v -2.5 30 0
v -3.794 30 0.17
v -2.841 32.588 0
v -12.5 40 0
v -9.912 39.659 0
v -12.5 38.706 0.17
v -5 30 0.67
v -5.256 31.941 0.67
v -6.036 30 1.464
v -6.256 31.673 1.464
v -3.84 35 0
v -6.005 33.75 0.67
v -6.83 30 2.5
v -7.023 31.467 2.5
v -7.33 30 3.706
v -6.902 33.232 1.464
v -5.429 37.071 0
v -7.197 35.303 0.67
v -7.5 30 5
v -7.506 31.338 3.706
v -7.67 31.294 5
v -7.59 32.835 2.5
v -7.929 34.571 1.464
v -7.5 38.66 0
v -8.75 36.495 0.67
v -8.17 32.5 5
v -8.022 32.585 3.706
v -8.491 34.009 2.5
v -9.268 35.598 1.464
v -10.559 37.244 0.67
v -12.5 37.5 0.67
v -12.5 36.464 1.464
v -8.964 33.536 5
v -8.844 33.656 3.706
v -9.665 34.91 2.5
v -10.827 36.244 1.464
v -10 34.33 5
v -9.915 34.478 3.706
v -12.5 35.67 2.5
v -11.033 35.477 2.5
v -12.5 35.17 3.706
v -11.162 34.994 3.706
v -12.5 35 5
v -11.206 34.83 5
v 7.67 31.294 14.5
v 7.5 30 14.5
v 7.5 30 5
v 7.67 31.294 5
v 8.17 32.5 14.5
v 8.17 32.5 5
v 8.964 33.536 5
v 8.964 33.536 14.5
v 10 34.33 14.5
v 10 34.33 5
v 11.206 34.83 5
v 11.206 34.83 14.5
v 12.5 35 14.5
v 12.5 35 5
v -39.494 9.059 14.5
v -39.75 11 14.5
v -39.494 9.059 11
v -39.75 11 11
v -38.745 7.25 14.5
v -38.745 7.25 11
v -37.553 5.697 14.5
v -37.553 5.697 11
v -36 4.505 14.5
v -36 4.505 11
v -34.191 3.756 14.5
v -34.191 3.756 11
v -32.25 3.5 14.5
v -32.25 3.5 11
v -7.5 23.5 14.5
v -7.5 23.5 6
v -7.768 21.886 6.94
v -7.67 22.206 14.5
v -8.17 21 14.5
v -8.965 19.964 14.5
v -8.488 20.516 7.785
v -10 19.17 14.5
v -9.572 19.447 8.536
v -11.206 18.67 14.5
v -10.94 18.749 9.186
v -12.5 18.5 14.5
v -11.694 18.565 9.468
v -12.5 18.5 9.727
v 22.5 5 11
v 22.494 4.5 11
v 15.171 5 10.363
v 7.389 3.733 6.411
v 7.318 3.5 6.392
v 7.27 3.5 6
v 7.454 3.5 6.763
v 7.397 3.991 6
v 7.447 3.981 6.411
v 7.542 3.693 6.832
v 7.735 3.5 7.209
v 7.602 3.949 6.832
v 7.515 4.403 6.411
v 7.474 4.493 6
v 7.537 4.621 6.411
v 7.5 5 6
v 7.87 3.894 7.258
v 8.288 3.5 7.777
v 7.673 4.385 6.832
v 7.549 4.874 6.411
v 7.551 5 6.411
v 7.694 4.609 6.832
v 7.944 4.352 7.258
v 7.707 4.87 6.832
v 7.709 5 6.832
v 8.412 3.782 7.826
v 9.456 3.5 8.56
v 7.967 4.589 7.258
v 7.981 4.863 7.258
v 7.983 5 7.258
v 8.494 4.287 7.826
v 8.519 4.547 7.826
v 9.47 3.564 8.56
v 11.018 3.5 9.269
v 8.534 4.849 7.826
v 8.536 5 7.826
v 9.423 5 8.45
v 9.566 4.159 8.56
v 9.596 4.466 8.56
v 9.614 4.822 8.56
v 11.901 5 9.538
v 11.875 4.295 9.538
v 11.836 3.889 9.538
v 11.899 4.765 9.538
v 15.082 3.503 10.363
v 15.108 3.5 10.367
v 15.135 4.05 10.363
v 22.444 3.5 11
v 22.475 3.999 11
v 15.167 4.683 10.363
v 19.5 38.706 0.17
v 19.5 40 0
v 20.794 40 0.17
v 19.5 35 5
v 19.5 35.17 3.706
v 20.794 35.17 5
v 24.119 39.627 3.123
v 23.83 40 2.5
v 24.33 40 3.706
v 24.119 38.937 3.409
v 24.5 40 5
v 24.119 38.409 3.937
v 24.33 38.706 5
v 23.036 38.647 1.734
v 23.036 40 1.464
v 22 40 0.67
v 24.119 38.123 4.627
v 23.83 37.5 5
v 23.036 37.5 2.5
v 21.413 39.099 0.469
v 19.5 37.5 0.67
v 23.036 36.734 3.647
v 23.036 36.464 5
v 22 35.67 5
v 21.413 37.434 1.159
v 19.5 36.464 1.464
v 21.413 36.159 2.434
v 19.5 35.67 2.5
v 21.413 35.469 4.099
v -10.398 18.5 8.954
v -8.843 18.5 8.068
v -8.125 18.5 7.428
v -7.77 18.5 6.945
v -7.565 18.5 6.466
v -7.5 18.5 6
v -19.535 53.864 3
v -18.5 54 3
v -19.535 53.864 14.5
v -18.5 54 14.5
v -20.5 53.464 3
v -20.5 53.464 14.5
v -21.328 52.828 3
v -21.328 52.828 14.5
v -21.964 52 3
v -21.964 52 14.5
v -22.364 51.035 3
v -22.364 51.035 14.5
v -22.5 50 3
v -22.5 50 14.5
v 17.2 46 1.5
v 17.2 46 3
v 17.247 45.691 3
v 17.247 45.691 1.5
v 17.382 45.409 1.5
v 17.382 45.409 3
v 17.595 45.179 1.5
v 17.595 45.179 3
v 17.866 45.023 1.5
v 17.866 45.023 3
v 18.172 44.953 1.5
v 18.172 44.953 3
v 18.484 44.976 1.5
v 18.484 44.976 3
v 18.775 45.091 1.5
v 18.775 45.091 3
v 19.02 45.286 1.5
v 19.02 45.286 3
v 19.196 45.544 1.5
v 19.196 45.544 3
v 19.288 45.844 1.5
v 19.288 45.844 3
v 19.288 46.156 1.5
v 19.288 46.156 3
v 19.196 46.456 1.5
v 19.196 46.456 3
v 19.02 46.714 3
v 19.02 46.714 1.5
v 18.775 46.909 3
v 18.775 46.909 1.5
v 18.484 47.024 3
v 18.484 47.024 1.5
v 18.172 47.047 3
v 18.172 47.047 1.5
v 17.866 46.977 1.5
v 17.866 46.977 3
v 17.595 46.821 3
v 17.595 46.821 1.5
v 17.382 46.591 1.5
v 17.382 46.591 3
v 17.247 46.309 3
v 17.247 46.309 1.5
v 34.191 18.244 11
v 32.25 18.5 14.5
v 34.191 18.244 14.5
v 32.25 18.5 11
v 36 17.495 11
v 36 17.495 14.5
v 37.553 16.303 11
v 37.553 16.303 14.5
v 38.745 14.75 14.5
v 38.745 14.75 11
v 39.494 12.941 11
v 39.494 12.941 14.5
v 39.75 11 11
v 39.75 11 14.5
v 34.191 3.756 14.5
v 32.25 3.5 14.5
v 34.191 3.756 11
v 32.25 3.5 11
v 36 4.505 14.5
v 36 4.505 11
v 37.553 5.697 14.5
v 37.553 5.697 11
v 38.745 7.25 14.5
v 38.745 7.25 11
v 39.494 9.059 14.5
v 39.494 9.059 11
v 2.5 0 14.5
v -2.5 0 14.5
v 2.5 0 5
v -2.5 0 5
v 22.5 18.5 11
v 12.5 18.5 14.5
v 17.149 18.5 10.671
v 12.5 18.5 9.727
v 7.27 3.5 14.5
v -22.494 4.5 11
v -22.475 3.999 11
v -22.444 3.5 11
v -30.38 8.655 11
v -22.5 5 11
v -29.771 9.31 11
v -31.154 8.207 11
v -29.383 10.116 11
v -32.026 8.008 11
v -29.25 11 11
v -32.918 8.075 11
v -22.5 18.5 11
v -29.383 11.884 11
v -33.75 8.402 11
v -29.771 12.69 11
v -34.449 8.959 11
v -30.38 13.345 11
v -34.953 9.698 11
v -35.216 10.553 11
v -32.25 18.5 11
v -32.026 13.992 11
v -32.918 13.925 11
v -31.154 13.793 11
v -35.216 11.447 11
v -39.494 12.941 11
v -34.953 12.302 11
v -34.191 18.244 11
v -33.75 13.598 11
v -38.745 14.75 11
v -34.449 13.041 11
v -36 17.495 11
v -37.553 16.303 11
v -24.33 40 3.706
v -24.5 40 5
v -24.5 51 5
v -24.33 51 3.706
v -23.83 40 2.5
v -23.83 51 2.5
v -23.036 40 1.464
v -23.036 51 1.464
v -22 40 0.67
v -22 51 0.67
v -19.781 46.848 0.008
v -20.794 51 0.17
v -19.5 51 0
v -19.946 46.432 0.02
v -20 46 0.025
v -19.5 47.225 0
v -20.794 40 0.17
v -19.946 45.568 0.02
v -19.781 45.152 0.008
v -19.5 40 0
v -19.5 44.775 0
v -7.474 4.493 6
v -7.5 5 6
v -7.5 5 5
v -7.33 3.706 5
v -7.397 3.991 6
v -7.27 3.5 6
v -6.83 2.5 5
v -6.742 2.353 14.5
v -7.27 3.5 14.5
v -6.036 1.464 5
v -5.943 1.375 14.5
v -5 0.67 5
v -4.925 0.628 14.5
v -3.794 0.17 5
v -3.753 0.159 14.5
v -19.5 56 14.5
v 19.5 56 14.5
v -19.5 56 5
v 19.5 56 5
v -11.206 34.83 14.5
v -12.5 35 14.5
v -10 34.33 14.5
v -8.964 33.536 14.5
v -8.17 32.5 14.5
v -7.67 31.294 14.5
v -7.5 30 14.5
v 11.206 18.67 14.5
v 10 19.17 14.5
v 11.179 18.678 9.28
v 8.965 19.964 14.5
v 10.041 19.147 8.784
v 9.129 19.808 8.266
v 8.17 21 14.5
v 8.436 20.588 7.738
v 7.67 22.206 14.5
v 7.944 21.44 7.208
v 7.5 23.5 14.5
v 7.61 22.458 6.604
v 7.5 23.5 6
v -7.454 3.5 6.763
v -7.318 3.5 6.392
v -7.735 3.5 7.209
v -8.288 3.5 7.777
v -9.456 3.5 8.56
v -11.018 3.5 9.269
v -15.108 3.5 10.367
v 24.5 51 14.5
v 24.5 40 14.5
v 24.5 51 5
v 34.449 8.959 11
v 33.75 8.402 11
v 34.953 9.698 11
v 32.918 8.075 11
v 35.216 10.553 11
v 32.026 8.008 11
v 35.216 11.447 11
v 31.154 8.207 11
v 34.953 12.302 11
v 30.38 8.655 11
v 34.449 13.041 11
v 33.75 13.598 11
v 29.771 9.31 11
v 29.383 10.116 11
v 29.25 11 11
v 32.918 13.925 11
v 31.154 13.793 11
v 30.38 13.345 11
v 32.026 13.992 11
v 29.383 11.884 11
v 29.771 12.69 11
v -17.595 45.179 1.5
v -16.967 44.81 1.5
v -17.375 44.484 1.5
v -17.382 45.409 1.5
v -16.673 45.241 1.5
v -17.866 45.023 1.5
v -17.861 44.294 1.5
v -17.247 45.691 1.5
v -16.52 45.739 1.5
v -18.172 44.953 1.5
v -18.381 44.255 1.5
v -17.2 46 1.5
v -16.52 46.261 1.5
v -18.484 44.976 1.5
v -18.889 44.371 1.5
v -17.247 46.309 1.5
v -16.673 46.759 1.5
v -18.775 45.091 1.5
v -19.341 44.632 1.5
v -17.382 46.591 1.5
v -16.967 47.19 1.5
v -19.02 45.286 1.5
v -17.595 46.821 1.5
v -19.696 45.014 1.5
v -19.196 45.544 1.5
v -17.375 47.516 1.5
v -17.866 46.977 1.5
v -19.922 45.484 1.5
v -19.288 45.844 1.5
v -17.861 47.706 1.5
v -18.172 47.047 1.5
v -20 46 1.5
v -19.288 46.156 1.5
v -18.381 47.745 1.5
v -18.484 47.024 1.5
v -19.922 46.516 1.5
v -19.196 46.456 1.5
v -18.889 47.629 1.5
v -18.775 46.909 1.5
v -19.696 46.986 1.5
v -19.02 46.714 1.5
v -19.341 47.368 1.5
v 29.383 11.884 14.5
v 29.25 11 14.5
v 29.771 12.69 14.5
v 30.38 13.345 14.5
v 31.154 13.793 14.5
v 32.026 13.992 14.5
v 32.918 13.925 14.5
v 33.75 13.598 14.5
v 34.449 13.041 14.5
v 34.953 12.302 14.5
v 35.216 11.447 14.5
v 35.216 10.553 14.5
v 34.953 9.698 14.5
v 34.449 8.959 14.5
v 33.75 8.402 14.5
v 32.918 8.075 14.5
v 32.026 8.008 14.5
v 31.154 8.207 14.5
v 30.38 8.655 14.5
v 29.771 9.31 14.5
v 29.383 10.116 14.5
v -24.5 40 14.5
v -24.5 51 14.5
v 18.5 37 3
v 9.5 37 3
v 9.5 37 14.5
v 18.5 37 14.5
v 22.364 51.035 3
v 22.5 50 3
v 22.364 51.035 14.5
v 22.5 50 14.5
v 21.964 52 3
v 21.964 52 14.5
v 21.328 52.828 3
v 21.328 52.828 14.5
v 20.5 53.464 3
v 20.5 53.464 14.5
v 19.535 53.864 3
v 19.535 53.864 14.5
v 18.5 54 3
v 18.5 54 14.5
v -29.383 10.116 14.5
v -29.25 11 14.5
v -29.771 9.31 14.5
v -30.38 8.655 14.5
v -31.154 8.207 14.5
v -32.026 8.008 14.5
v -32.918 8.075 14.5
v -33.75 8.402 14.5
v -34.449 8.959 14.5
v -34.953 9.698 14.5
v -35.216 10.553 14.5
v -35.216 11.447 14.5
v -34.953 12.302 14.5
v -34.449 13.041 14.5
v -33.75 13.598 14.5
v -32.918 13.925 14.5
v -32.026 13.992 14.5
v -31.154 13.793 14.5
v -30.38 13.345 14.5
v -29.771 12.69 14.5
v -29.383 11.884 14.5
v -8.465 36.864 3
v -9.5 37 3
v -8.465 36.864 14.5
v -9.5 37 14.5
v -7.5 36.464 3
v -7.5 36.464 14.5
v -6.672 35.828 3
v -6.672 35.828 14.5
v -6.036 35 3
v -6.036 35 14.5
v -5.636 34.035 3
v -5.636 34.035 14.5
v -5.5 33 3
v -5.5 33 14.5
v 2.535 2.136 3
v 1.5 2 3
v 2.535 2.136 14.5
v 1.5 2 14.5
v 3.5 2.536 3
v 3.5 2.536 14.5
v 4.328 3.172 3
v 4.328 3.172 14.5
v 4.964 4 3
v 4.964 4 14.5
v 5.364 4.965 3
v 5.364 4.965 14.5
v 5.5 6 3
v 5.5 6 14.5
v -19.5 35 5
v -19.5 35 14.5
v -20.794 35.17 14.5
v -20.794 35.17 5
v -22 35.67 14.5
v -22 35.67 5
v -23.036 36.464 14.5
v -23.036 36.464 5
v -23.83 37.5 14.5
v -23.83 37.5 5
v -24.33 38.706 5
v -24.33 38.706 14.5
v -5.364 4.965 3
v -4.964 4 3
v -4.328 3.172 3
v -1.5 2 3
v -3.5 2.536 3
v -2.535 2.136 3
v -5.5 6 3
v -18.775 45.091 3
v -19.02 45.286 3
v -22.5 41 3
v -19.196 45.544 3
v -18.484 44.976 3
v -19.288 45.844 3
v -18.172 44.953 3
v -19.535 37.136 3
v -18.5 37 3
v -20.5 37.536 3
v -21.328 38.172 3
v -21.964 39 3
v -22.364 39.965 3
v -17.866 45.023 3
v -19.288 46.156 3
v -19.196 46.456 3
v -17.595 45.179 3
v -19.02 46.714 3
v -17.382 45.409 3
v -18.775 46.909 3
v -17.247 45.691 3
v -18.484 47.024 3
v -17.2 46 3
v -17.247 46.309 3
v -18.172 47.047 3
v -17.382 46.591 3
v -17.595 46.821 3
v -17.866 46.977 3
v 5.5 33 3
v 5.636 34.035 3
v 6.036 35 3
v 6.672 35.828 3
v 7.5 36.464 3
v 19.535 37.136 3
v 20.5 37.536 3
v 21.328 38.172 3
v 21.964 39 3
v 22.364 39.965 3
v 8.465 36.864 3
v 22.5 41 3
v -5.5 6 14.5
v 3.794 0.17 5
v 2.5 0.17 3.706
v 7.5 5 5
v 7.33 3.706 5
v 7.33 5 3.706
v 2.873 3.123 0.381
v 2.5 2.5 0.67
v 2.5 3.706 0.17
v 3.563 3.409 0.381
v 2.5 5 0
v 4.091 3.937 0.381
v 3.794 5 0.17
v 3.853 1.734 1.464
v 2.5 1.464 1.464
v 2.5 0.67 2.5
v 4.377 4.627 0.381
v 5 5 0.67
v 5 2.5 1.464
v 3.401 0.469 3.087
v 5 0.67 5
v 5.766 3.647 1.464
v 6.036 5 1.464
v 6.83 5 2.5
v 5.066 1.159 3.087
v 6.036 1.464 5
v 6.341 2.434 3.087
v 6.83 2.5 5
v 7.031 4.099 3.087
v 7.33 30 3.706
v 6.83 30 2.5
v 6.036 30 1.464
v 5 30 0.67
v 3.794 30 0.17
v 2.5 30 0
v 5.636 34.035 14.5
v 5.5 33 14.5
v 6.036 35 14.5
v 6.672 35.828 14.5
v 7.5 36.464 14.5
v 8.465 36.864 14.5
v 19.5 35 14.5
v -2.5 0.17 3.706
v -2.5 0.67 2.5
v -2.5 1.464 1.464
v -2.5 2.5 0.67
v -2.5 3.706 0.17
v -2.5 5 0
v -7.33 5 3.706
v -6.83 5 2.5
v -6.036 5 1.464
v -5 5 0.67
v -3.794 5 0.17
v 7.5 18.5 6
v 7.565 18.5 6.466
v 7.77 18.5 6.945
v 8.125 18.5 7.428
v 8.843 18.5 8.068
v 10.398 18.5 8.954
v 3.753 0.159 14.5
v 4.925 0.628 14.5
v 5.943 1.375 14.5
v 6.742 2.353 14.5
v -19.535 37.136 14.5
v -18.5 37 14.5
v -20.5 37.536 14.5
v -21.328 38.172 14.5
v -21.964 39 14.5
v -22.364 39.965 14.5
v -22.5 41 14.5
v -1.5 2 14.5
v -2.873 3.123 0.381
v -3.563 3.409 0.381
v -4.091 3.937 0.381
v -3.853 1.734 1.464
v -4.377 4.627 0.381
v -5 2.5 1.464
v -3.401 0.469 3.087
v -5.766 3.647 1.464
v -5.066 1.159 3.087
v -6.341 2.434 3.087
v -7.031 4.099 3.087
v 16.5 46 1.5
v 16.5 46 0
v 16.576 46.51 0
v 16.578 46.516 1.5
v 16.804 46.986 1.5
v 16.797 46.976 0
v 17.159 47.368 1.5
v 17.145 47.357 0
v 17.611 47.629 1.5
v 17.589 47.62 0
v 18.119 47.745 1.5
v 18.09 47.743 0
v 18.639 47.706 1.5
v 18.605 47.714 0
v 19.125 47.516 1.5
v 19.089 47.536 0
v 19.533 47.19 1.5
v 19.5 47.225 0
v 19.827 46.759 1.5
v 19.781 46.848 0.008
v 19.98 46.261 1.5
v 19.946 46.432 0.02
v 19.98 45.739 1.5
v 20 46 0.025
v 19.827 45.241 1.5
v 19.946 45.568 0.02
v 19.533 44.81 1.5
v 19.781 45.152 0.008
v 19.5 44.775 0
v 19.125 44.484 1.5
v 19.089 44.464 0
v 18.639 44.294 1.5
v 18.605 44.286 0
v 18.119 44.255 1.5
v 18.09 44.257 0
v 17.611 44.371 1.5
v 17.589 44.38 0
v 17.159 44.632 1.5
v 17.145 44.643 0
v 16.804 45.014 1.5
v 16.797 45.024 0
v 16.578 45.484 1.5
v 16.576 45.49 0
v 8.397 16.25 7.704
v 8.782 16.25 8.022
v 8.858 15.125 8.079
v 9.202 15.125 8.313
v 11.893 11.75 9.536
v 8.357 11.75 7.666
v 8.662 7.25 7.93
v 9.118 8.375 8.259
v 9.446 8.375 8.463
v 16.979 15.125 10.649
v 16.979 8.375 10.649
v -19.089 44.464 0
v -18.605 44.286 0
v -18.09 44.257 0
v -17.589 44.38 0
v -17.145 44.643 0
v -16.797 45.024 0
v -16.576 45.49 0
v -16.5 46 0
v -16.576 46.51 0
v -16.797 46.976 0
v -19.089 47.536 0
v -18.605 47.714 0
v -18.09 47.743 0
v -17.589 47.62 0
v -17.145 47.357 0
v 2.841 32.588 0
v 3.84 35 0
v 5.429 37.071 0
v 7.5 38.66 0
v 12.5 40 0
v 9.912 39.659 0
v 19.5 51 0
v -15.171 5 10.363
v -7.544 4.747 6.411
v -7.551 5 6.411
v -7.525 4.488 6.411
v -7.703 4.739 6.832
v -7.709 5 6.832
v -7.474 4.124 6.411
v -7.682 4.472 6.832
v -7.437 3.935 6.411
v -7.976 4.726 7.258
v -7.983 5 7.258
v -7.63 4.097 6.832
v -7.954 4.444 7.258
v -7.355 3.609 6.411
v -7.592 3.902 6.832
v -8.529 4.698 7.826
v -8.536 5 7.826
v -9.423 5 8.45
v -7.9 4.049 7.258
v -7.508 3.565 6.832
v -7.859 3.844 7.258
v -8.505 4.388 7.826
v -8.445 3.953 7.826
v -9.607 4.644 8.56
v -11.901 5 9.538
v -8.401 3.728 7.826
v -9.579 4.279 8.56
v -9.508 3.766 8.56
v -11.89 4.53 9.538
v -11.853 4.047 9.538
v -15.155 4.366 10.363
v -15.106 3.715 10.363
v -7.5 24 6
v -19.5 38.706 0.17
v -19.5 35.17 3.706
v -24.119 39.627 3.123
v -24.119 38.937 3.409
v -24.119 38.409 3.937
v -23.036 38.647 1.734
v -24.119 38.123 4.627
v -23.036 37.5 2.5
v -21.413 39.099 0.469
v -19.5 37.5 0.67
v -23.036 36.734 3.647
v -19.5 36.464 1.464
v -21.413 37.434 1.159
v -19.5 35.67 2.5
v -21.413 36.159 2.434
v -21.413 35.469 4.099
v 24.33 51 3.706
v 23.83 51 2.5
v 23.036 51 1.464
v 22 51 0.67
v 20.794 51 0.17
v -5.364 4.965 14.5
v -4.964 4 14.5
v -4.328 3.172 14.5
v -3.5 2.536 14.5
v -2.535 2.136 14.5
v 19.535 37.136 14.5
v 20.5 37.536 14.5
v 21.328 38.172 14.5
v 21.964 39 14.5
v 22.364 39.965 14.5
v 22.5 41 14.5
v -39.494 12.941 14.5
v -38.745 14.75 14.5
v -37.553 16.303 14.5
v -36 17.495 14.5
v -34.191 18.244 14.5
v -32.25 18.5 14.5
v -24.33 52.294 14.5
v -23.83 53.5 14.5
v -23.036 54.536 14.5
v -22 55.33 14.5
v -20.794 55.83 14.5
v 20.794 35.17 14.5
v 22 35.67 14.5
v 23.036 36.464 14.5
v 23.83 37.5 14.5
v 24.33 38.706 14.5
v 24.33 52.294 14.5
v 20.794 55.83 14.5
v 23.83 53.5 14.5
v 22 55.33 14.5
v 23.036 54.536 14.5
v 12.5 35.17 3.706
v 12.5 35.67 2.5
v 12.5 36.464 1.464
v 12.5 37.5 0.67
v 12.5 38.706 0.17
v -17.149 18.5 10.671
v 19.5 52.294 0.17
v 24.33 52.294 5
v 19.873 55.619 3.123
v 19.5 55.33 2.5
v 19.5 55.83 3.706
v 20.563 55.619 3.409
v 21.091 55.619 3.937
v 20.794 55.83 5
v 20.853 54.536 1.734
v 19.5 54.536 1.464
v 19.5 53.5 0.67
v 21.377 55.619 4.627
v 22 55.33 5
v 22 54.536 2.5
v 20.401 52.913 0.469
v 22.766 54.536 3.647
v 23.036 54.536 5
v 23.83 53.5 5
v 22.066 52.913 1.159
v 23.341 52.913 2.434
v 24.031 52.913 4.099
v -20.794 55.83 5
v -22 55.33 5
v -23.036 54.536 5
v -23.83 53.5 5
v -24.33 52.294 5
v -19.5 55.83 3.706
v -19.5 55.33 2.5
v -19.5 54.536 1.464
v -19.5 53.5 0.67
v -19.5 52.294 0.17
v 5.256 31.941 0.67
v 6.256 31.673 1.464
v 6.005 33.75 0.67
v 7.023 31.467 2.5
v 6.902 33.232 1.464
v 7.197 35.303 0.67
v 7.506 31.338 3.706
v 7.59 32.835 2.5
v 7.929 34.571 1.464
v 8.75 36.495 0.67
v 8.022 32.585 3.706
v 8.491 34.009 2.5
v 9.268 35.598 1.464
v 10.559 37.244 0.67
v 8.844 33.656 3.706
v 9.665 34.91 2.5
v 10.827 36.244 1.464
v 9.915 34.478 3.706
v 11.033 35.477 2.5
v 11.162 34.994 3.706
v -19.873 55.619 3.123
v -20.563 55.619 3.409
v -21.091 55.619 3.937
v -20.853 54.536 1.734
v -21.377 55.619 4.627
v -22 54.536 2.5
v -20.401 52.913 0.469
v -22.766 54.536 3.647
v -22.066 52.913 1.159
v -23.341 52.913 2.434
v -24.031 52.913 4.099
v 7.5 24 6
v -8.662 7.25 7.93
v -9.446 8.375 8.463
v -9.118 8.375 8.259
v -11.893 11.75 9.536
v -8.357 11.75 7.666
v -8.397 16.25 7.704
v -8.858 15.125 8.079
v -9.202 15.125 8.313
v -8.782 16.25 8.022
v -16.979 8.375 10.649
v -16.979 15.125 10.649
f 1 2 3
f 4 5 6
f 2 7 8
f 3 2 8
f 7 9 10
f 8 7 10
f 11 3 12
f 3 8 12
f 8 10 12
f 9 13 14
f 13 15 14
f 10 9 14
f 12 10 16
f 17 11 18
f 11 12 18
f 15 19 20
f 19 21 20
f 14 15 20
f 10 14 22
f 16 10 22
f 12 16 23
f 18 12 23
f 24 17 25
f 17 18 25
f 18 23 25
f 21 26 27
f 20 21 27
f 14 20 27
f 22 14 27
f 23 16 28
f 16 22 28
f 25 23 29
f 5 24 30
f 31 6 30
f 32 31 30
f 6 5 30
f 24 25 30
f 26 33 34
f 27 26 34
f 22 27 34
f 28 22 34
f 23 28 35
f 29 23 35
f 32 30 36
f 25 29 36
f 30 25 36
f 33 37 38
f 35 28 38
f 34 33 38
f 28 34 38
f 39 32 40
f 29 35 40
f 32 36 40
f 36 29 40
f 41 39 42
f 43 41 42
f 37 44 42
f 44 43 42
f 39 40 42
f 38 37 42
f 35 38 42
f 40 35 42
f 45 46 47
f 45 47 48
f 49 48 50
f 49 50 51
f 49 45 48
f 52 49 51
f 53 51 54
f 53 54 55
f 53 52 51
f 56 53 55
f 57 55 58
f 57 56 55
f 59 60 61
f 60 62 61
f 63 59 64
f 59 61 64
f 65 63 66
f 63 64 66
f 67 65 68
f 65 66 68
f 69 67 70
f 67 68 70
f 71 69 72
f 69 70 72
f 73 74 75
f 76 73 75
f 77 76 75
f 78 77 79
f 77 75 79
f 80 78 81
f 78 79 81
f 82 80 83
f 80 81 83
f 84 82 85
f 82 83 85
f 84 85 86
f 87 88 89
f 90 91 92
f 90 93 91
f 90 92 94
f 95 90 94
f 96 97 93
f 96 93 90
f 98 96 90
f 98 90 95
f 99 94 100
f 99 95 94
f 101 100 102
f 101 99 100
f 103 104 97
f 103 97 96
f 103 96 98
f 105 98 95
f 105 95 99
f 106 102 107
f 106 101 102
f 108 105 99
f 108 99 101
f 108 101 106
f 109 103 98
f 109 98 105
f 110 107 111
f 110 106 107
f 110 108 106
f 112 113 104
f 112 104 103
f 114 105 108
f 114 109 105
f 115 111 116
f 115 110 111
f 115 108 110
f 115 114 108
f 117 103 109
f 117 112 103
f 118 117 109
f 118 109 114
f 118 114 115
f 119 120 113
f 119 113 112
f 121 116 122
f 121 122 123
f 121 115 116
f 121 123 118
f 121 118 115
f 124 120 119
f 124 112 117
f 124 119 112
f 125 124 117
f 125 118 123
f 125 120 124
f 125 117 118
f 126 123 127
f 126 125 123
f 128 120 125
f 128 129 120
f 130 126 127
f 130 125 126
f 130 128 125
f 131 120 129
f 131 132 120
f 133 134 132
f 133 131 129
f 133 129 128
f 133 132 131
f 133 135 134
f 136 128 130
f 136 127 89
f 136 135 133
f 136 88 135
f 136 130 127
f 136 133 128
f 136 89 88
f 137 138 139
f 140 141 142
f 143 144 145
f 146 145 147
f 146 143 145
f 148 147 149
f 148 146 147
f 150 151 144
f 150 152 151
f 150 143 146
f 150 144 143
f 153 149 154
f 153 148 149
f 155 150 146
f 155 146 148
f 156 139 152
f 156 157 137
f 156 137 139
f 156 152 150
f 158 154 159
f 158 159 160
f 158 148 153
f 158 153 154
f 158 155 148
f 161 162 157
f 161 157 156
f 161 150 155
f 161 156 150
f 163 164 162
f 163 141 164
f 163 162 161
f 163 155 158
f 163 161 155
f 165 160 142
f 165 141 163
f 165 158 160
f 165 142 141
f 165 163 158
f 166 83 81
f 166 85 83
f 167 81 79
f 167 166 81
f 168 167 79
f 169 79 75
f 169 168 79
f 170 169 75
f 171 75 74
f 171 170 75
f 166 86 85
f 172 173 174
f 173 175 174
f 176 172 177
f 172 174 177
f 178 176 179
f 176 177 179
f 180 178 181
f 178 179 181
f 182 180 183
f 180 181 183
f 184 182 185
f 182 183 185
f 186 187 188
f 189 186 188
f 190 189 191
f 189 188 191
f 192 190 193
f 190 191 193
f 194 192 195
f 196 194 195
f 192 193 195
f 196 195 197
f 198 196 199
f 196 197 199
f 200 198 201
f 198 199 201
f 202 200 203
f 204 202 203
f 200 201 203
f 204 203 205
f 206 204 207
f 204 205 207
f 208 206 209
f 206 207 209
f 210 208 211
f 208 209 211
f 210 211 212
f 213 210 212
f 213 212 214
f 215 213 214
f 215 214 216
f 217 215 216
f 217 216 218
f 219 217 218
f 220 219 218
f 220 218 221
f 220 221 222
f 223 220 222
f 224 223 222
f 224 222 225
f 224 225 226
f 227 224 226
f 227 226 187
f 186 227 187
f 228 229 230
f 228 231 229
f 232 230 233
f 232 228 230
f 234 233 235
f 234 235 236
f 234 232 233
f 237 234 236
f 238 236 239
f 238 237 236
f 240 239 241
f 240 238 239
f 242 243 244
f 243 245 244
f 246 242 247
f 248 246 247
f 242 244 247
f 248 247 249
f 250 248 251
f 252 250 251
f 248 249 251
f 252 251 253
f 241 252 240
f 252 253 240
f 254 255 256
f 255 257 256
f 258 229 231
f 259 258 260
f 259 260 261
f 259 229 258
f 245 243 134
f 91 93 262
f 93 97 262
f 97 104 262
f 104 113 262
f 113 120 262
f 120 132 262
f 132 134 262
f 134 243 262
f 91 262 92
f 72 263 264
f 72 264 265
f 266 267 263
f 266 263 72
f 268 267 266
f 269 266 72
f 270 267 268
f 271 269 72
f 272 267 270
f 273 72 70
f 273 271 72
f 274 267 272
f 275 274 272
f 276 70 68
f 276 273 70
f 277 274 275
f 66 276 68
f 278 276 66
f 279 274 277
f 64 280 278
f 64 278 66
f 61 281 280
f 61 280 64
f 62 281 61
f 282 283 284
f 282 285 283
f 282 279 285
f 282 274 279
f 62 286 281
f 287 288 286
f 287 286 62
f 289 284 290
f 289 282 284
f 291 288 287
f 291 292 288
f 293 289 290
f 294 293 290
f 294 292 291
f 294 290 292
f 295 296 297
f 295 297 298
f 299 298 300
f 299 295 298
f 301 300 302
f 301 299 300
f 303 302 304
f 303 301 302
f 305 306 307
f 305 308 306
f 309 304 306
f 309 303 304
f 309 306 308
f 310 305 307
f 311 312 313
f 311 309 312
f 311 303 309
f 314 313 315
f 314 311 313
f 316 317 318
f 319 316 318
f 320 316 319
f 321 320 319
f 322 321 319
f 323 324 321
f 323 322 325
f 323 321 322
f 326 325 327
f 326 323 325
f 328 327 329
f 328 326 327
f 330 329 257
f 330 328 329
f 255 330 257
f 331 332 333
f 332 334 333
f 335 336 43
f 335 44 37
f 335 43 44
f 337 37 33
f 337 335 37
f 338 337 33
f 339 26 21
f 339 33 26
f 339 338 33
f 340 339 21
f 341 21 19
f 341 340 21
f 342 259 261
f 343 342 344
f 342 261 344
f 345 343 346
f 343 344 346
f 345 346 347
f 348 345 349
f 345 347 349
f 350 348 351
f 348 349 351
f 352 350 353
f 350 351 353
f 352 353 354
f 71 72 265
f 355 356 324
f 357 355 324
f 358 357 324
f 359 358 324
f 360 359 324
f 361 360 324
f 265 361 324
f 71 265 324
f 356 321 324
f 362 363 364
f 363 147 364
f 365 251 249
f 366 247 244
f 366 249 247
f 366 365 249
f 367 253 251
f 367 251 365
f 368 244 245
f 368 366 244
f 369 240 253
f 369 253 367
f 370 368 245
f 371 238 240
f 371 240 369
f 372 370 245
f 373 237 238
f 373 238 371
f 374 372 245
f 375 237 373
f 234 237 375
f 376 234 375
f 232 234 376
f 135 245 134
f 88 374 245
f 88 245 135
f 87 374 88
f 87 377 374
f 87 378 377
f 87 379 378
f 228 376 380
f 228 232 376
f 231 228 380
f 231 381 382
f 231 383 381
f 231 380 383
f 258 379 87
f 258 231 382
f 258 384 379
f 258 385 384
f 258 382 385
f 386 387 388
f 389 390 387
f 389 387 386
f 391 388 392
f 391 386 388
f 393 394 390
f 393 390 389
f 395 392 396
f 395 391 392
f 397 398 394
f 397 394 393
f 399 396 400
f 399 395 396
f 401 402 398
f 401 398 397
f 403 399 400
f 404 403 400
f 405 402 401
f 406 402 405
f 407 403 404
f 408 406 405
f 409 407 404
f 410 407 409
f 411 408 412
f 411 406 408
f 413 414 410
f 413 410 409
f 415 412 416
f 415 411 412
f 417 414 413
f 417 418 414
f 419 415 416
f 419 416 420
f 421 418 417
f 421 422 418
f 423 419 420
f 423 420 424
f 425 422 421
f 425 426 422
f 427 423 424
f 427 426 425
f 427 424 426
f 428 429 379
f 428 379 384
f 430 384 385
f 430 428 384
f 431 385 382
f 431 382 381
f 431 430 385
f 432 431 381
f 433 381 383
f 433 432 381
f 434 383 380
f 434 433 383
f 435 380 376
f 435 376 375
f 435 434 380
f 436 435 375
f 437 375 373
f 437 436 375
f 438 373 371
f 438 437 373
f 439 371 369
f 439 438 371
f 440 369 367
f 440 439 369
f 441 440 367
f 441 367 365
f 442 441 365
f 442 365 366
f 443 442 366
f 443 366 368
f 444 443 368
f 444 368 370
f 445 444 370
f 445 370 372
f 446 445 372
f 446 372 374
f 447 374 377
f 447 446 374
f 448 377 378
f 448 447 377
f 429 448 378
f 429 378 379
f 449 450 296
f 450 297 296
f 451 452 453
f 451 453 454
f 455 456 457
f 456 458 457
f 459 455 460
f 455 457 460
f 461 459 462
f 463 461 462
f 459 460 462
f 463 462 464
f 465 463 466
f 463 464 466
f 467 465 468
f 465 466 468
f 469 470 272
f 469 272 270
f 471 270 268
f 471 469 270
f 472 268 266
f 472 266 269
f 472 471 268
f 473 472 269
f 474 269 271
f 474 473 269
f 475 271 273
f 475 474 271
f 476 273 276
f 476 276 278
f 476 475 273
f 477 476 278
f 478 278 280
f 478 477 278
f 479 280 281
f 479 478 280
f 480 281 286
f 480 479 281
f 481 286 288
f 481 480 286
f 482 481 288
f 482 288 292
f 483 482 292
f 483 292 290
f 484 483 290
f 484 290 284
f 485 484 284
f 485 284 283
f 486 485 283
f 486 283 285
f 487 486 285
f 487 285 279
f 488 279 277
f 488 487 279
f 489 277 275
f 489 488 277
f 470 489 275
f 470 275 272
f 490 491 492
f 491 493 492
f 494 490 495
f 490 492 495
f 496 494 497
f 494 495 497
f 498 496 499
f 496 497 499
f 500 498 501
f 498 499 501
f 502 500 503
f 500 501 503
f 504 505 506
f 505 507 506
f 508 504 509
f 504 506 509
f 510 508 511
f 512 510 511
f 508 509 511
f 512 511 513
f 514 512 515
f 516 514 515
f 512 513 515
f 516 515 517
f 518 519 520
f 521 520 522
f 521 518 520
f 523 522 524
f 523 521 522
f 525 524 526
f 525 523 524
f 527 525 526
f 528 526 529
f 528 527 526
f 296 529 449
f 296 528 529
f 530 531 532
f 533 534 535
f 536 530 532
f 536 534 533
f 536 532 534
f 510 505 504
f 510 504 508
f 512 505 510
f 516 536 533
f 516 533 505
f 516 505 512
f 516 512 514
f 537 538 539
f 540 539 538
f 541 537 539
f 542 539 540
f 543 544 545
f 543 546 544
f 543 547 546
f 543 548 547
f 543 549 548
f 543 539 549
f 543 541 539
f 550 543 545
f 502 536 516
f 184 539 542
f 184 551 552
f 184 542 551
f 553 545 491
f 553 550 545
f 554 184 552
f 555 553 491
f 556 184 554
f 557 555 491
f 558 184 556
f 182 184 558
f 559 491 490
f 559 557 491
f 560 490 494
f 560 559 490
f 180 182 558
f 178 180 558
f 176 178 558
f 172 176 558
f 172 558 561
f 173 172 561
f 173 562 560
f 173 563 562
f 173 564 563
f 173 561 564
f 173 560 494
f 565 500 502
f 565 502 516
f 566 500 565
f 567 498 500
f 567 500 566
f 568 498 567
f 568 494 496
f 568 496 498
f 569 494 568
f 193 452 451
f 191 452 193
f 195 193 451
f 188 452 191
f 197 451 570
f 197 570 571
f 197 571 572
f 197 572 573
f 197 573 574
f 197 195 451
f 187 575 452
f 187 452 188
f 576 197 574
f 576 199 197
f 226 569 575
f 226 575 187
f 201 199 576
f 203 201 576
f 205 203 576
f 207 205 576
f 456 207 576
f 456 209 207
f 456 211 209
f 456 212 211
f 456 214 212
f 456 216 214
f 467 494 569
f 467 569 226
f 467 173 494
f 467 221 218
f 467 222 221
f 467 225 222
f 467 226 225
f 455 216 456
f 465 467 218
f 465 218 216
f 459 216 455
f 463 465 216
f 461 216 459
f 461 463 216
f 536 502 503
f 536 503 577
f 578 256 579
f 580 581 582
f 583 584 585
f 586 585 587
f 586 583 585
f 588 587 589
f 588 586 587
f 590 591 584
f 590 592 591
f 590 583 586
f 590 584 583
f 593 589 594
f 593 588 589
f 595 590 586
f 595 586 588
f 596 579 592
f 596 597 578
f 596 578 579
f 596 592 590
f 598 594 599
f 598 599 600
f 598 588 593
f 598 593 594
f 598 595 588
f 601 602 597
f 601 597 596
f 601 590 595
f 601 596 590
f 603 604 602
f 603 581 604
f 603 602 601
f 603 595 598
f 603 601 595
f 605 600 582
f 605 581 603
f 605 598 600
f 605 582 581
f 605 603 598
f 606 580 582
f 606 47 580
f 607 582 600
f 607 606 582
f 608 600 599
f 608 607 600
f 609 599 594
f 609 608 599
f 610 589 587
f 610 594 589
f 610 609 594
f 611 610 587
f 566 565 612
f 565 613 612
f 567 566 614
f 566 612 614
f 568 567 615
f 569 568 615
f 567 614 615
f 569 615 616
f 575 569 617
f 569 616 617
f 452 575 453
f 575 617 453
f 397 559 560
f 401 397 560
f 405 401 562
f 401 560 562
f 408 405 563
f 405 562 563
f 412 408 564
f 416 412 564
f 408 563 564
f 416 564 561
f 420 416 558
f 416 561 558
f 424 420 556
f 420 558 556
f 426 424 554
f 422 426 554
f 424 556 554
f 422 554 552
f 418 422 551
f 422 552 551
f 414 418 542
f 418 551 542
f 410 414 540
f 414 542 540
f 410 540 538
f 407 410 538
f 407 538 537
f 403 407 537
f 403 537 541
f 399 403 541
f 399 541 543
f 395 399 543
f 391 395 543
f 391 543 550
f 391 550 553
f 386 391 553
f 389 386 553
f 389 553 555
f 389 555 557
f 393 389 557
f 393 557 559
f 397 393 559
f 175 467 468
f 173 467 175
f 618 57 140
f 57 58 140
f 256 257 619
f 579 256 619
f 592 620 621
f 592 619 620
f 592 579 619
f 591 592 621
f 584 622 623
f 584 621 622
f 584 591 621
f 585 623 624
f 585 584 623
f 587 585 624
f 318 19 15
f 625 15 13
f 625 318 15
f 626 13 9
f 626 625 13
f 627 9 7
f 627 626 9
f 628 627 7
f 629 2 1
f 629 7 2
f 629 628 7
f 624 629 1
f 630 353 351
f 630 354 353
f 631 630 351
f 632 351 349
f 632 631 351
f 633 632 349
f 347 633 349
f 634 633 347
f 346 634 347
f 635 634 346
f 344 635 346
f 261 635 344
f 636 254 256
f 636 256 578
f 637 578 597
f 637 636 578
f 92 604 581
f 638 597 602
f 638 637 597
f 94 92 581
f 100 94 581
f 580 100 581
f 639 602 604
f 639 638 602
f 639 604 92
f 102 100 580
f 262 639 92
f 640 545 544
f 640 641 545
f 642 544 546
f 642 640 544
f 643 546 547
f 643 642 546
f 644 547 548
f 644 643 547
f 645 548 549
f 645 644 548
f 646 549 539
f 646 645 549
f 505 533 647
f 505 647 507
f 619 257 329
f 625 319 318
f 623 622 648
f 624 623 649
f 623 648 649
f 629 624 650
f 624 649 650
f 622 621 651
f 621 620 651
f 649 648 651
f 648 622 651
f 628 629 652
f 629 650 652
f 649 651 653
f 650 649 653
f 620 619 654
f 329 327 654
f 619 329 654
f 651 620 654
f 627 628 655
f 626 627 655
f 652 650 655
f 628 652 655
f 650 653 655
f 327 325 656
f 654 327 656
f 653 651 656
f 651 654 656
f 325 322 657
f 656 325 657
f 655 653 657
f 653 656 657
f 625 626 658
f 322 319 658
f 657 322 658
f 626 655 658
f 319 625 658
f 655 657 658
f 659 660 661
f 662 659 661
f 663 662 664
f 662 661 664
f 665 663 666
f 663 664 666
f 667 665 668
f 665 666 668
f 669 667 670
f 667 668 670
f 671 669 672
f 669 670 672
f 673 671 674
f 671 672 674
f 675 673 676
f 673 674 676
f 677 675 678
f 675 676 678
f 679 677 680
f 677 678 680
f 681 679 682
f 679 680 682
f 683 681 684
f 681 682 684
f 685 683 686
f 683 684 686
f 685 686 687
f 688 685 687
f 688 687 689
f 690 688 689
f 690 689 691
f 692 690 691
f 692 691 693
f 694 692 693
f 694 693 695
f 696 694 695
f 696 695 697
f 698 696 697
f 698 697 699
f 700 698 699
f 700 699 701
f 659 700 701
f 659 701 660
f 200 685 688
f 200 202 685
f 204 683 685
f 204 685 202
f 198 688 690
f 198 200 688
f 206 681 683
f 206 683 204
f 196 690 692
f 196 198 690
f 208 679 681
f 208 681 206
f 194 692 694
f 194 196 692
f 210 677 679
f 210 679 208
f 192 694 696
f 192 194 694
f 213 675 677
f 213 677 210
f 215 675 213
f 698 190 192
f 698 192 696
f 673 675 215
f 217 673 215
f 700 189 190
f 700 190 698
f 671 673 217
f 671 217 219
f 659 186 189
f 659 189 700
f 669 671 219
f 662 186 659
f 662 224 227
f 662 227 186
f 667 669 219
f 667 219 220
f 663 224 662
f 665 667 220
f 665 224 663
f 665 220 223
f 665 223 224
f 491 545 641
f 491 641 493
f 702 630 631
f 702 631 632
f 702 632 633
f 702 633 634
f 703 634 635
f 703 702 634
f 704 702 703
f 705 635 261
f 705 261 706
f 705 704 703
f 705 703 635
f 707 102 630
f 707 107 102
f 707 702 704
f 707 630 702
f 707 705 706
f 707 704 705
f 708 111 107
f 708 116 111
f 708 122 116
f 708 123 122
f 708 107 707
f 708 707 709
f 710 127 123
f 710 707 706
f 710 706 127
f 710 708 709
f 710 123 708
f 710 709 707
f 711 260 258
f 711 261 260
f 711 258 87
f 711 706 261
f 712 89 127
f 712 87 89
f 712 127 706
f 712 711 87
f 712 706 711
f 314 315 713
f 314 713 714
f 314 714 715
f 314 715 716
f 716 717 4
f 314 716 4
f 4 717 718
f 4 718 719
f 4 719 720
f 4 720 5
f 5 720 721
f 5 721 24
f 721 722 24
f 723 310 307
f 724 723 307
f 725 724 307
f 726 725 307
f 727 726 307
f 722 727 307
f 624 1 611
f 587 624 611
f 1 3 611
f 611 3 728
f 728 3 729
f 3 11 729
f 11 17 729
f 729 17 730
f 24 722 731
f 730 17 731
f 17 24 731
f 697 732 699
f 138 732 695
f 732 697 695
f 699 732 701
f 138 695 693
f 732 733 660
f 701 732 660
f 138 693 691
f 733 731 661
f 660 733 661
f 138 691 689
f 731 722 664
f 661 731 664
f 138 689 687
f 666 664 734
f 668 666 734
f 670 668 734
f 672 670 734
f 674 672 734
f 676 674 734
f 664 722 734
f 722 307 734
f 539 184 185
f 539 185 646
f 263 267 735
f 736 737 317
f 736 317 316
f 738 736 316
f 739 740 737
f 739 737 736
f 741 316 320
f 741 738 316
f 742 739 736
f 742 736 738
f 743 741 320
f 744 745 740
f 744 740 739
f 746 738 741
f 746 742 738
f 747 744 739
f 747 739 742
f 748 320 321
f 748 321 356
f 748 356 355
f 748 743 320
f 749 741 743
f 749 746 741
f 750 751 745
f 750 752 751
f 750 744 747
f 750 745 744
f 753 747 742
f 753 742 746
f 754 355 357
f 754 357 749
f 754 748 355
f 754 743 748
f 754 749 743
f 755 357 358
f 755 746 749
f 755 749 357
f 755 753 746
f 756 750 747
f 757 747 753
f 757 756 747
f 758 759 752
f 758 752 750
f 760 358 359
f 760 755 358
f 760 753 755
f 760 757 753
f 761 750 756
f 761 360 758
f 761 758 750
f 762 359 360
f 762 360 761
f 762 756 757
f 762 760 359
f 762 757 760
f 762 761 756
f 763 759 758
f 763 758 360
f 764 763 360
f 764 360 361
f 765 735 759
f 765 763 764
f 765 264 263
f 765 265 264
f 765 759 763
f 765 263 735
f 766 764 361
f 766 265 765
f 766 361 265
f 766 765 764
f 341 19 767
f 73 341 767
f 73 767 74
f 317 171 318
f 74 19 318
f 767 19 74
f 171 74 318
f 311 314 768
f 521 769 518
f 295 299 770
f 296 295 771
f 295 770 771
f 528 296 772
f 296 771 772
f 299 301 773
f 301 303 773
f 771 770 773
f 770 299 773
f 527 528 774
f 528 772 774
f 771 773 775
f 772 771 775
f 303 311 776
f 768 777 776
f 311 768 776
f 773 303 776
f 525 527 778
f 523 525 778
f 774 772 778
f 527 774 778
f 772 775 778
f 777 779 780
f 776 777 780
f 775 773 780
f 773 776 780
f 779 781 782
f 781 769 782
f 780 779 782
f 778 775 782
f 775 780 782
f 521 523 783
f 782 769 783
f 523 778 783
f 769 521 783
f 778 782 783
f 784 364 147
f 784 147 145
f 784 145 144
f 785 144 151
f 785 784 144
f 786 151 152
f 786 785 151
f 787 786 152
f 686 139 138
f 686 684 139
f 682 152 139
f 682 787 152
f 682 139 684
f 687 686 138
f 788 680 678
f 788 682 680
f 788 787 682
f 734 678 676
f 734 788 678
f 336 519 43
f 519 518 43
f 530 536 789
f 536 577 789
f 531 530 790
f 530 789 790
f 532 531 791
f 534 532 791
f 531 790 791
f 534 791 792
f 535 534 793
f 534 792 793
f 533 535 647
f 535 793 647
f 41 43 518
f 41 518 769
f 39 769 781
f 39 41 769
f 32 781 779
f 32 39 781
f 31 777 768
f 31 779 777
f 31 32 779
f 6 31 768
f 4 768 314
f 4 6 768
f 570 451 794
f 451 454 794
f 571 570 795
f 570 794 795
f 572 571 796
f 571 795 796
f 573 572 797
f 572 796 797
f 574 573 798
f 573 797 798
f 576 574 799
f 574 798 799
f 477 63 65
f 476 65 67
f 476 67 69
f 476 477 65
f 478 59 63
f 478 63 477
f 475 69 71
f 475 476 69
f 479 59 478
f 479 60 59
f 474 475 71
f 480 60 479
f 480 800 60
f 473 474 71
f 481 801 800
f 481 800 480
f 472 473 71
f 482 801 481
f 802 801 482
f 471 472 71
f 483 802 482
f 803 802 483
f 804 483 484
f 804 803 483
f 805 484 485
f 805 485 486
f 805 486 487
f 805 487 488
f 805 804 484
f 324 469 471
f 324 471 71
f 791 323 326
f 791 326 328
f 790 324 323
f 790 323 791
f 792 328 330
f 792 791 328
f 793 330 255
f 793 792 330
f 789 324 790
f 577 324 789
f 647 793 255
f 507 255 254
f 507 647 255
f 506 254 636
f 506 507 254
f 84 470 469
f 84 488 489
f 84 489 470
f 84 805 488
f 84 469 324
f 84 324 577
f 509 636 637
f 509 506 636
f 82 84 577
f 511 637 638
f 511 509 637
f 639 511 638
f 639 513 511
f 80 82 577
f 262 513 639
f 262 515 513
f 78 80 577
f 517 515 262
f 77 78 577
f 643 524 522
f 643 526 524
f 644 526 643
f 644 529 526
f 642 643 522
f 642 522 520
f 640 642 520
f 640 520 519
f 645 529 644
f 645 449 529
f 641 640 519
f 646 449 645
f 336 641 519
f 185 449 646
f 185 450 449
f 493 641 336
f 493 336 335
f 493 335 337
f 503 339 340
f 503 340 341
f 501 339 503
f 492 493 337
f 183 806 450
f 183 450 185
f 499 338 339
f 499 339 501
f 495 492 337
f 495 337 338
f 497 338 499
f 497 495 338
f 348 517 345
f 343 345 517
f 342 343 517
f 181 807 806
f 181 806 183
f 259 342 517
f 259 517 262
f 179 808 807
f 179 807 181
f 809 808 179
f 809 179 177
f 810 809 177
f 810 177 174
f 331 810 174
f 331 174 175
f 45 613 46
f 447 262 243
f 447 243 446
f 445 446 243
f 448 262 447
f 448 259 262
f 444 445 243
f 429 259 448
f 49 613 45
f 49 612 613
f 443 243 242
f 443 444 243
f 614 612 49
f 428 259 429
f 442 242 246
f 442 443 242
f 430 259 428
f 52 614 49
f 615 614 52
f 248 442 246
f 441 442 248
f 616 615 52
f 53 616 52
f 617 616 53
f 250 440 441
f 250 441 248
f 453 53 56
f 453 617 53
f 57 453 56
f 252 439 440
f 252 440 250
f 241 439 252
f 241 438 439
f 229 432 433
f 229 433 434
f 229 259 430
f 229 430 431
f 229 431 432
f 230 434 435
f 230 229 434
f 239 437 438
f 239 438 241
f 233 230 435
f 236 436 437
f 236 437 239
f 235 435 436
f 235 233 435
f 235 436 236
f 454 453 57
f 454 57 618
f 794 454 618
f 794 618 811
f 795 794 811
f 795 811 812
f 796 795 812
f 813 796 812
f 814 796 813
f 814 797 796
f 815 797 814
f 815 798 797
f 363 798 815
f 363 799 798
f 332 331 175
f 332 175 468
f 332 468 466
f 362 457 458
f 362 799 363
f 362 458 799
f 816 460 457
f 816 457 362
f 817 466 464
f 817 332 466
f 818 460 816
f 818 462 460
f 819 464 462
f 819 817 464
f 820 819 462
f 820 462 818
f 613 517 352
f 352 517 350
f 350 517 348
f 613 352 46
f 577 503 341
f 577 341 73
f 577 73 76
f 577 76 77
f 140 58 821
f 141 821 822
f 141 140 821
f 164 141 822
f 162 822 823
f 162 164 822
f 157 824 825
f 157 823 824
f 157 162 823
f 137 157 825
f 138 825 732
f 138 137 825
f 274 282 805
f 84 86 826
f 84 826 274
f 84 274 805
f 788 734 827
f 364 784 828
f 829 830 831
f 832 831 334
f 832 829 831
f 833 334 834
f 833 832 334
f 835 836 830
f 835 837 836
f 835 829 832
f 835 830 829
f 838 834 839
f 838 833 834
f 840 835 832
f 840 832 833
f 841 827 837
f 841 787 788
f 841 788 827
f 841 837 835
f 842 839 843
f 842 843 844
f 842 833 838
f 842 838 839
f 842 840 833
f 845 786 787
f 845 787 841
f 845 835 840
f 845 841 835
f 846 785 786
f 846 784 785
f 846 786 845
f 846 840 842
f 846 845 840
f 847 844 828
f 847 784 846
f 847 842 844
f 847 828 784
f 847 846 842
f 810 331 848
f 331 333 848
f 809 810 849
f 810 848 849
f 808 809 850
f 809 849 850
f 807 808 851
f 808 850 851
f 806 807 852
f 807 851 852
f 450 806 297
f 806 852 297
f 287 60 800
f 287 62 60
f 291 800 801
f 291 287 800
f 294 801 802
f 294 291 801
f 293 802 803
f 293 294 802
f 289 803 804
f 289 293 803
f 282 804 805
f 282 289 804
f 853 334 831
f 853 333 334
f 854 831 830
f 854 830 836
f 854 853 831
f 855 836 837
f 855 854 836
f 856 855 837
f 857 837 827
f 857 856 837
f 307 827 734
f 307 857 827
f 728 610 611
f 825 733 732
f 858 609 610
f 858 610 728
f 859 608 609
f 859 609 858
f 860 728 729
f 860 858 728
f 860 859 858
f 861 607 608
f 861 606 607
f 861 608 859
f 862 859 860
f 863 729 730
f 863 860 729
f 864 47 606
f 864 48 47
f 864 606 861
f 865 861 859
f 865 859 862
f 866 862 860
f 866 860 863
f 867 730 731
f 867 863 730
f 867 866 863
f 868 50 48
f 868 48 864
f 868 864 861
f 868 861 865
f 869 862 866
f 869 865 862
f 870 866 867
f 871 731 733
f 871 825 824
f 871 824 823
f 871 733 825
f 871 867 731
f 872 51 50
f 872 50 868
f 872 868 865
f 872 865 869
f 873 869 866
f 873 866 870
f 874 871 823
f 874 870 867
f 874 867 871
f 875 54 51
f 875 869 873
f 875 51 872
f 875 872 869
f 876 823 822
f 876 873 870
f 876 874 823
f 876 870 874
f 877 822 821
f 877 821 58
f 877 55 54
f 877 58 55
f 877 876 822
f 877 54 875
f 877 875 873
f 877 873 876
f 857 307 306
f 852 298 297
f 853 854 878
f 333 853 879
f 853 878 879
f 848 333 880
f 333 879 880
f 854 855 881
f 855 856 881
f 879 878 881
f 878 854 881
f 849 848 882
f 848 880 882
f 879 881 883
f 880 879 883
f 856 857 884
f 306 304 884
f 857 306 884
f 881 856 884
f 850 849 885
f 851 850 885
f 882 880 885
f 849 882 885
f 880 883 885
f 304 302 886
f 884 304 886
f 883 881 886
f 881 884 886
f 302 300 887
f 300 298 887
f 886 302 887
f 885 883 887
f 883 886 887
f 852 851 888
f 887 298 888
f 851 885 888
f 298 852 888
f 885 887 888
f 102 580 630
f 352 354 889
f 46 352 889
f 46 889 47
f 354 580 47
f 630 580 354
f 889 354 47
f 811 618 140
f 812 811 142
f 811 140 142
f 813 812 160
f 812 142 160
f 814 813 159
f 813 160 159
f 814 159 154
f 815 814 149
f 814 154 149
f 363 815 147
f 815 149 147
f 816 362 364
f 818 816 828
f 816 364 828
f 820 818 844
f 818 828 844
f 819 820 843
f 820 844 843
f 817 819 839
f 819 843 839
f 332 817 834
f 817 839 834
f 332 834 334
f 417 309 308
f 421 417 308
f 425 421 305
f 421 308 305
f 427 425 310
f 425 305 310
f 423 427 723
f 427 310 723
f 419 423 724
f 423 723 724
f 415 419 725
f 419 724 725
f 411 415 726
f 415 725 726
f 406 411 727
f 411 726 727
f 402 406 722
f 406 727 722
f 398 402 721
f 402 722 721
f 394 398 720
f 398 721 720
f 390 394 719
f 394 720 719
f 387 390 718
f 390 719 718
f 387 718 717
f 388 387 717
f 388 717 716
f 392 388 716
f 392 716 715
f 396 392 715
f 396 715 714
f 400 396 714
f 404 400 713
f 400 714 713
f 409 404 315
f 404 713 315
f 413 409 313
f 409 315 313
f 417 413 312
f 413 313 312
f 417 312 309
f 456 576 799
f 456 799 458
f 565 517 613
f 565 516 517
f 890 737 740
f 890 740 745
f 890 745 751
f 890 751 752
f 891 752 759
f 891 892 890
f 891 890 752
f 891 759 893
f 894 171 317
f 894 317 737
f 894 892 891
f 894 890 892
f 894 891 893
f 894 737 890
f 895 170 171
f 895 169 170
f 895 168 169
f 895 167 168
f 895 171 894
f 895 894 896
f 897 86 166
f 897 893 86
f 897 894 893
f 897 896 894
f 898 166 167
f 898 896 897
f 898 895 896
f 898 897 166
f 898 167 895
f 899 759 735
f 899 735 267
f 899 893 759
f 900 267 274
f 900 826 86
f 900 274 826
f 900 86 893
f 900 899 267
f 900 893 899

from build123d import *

# Parameters (mm, degrees)
BOSS_EXTRUDE1_DEPTH = 3
BOSS_EXTRUDE5_DEPTH = 11.5
SKETCH7_W           = 32.25
SKETCH7_H           = 15
SKETCH7_R           = 3
BOSS_EXTRUDE6_DEPTH = 3.5
FILLET4_R           = 4
FILLET5_R           = 5
FILLET6_SIZE        = 5
FILLET6_SIZE_2      = 15
FILLET7_START       = 5.9999999
FILLET7_DEPTH       = 8.5000001
FILLET7_START_2     = 18.5
FILLET7_2_DEPTH     = 5.5
FILLET8_R           = 7.5
SKETCH9_R           = 1.05
CUT_EXTRUDE2_DEPTH  = 70.629824804
SKETCH10_R          = 1.75
CUT_EXTRUDE3_DEPTH  = 1.5


with BuildPart() as part:
    # Sketch1 → Boss-Extrude1 (new body)
    with BuildSketch(Plane.XY):
        Polygon((7.5, 35), (24.5, 35), (24.5, 56), (-24.5, 56), (-24.5, 35), (-7.5, 35), (-7.5, 0), (7.5, 0), align=None)
    extrude(amount=BOSS_EXTRUDE1_DEPTH)

    # Sketch6 → Boss-Extrude5 (add)
    with BuildSketch(Plane.XY.offset(3)):
        Polygon((-24.5, 35), (-7.5, 35), (-7.5, 0), (7.5, 0), (7.5, 35), (24.5, 35), (24.5, 56), (-24.5, 56), align=None)
        Polygon((-22.5, 37), (-5.5, 37), (-5.5, 2), (5.5, 2), (5.5, 37), (22.5, 37), (22.5, 54), (-22.5, 54), align=None, mode=Mode.SUBTRACT)
    extrude(amount=BOSS_EXTRUDE5_DEPTH)

    # Sketch7 → Boss-Extrude6 (add)
    # profile 1 of 2: a face of its own
    with BuildSketch(Plane(origin=(0, 0, 14.5), x_dir=(-1, 0, 0), z_dir=(0, 0, -1))):
        with Locations((-23.625, 11)):
            Rectangle(SKETCH7_W, SKETCH7_H)
        with Locations((-32.25, 11)):
            Circle(SKETCH7_R, mode=Mode.SUBTRACT)
    # profile 2 of 2: a face of its own
    with BuildSketch(Plane(origin=(0, 0, 14.5), x_dir=(-1, 0, 0), z_dir=(0, 0, -1))):
        with Locations((23.625, 11)):
            Rectangle(SKETCH7_W, SKETCH7_H)
        with Locations(Location((32.25, 11, 0), (0, 0, 180))):
            Circle(SKETCH7_R, mode=Mode.SUBTRACT)
    extrude(amount=BOSS_EXTRUDE6_DEPTH)

    # Fillet4
    fillet4_edges = [part.edges().sort_by_distance(p)[0] for p in [
        (-22.5, 37, 8.75),
        (-5.5, 37, 8.75),
        (-5.5, 2, 8.75),
        (5.5, 2, 8.75),
        (5.5, 37, 8.75),
        (22.5, 37, 8.75),
        (22.5, 54, 8.75),
        (-22.5, 54, 8.75),
    ]]
    fillet(fillet4_edges, radius=FILLET4_R)

    # Fillet5
    fillet5_edges = [part.edges().sort_by_distance(p)[0] for p in [
        (-7.5, 35, 7.25),
        (7.5, 35, 7.25),
        (-7.5, 0, 7.25),
        (7.5, 0, 7.25),
        (0, 0, 0),
        (7.5, 17.5, 0),
        (-7.5, 17.5, 0),
        (-16, 35, 0),
        (16, 35, 0),
        (-24.5, 45.5, 0),
        (24.5, 45.5, 0),
        (0, 56, 0),
        (24.5, 35, 7.25),
        (24.5, 56, 7.25),
        (-24.5, 35, 7.25),
        (-24.5, 56, 7.25),
    ]]
    fillet(fillet5_edges, radius=FILLET5_R)

    # Fillet6
    # a fillet whose section is not a circle: 15, 5 mm, written as the material it adds along each edge
    with BuildSketch(Plane(origin=(-2.5, 5, 11), x_dir=(-1, 0, 0), z_dir=(0, 1, 0))) as fillet6_piece_1_section:
        with BuildLine():
            Bezier((5, -FILLET6_SIZE), (5, 0), (5 + FILLET6_SIZE_2, 0), weights=[1, 0.707106781, 1])
            Line((5 + FILLET6_SIZE_2, 0), (5, 0))
            Line((5, 0), (5, -FILLET6_SIZE))
        make_face()
    fillet6_piece_1 = revolve(axis=Axis((-2.5, 5, 11), (0, 0, 1)), revolution_arc=359.64, mode=Mode.PRIVATE)
    fillet6_piece_1 = split(fillet6_piece_1, bisect_by=Plane(origin=(-2.5, 18.5, 11), z_dir=(0, -1, 0)), keep=Keep.TOP, mode=Mode.PRIVATE)
    fillet6_piece_1 = split(fillet6_piece_1, bisect_by=Plane(origin=(-2.5, 3.5, 11), z_dir=(0, 1, 0)), keep=Keep.TOP, mode=Mode.PRIVATE)
    fillet6_piece_1 = split(fillet6_piece_1, bisect_by=Plane(origin=(-5.5, 5, 11), z_dir=(-1, 0, 0)), keep=Keep.TOP, mode=Mode.PRIVATE)
    add(fillet6_piece_1)
    with BuildSketch(Plane(origin=(-2.5, 5, 11), x_dir=(-1, 0, 0), z_dir=(0, 1, 0))) as fillet6_piece_2_section:
        with BuildLine():
            Bezier((5, -FILLET6_SIZE), (5, 0), (5 + FILLET6_SIZE_2, 0), weights=[1, 0.707106781, 1])
            Line((5 + FILLET6_SIZE_2, 0), (5, 0))
            Line((5, 0), (5, -FILLET6_SIZE))
        make_face()
    fillet6_piece_2 = revolve(axis=Axis((-2.5, 5, 11), (0, 0, 1)), revolution_arc=359.64, mode=Mode.PRIVATE)
    fillet6_piece_2 = split(fillet6_piece_2, bisect_by=Plane(origin=(-2.5, 18.5, 11), z_dir=(0, -1, 0)), keep=Keep.TOP, mode=Mode.PRIVATE)
    fillet6_piece_2 = split(fillet6_piece_2, bisect_by=Plane(origin=(-2.5, 3.5, 11), z_dir=(0, 1, 0)), keep=Keep.TOP, mode=Mode.PRIVATE)
    fillet6_piece_2 = split(fillet6_piece_2, bisect_by=Plane(origin=(5.5, 5, 11), z_dir=(1, 0, 0)), keep=Keep.TOP, mode=Mode.PRIVATE)
    add(fillet6_piece_2)
    with BuildSketch(Plane(origin=(-7.5, 18.5, 11), x_dir=(0, 0, -1), z_dir=(0, -1, 0)), Plane(origin=(7.5, 5, 11), x_dir=(0, 0, -1), z_dir=(0, 1, 0))) as fillet6_piece_3:
        with BuildLine():
            Bezier((FILLET6_SIZE, 0), (0, 0), (0, -FILLET6_SIZE_2), weights=[1, 0.707106781, 1])
            Line((0, -FILLET6_SIZE_2), (0, 0))
            Line((0, 0), (FILLET6_SIZE, 0))
        make_face()
    extrude(amount=13.5)
    with BuildSketch(Plane(origin=(2.5, 5, 11), x_dir=(0.9999802608561371, 0.006283143965559468, 0), z_dir=(0.006283143965559468, -0.9999802608561371, 0))) as fillet6_piece_4_section:
        with BuildLine():
            Bezier((5, -FILLET6_SIZE), (5, 0), (5 + FILLET6_SIZE_2, 0), weights=[1, 0.707106781, 1])
            Line((5 + FILLET6_SIZE_2, 0), (5, 0))
            Line((5, 0), (5, -FILLET6_SIZE))
        make_face()
    fillet6_piece_4 = revolve(axis=Axis((2.5, 5, 11), (0, 0, 1)), revolution_arc=359.64, mode=Mode.PRIVATE)
    fillet6_piece_4 = split(fillet6_piece_4, bisect_by=Plane(origin=(2.5, 18.5, 11), z_dir=(0, -1, 0)), keep=Keep.TOP, mode=Mode.PRIVATE)
    fillet6_piece_4 = split(fillet6_piece_4, bisect_by=Plane(origin=(2.5, 3.5, 11), z_dir=(0, 1, 0)), keep=Keep.TOP, mode=Mode.PRIVATE)
    fillet6_piece_4 = split(fillet6_piece_4, bisect_by=Plane(origin=(5.5, 5, 11), z_dir=(1, 0, 0)), keep=Keep.TOP, mode=Mode.PRIVATE)
    add(fillet6_piece_4)
    with BuildSketch(Plane(origin=(2.5, 5, 11), x_dir=(0.9999802608561371, 0.006283143965559468, 0), z_dir=(0.006283143965559468, -0.9999802608561371, 0))) as fillet6_piece_5_section:
        with BuildLine():
            Bezier((5, -FILLET6_SIZE), (5, 0), (5 + FILLET6_SIZE_2, 0), weights=[1, 0.707106781, 1])
            Line((5 + FILLET6_SIZE_2, 0), (5, 0))
            Line((5, 0), (5, -FILLET6_SIZE))
        make_face()
    fillet6_piece_5 = revolve(axis=Axis((2.5, 5, 11), (0, 0, 1)), revolution_arc=359.64, mode=Mode.PRIVATE)
    fillet6_piece_5 = split(fillet6_piece_5, bisect_by=Plane(origin=(2.5, 18.5, 11), z_dir=(0, -1, 0)), keep=Keep.TOP, mode=Mode.PRIVATE)
    fillet6_piece_5 = split(fillet6_piece_5, bisect_by=Plane(origin=(2.5, 3.5, 11), z_dir=(0, 1, 0)), keep=Keep.TOP, mode=Mode.PRIVATE)
    fillet6_piece_5 = split(fillet6_piece_5, bisect_by=Plane(origin=(-5.5, 5, 11), z_dir=(-1, 0, 0)), keep=Keep.TOP, mode=Mode.PRIVATE)
    add(fillet6_piece_5)

    # Fillet7: read off the stored shape, not the designer's step
    # Fillet7 outline → Fillet7 (add)
    with BuildSketch(Plane.XY.offset(FILLET7_START)):
        with BuildLine():
            Line((-7.5, 18.5), (-7.5, 23.5))
            ThreePointArc((-7.5, 23.5), (-8.964554264, 19.964377926), (-12.500249379, 18.500000006))
            Line((-12.500249379, 18.500000006), (-7.5, 18.5))
        make_face()
        with BuildLine():
            Line((7.5, 18.5), (12.500245622, 18.500000006))
            ThreePointArc((12.500245622, 18.500000006), (8.964552936, 19.964379255), (7.5, 23.5))
            Line((7.5, 23.5), (7.5, 18.5))
        make_face()
    extrude(amount=FILLET7_DEPTH)

    # Fillet7 2 outline → Fillet7 2 (cut)
    with BuildSketch(Plane(origin=(0, 0, 0), x_dir=(1, 0, 0), z_dir=(0, 1, 0)).offset(FILLET7_START_2)):
        with BuildLine():
            Line((-14, -5.9999999), (-14, -10.119735698))
            add(Edge.make_bspline(
                [(-14, -10.119735698), (-7.5, -8.629618531), (-7.5, -6)],
                knots=[0.389274824, 0.389274824, 0.389274824, 1, 1, 1], degree=2, weights=[0.86073517, 0.821122737, 1]))
            Line((-7.5, -6), (-14, -5.9999999))
        make_face()
        with BuildLine():
            add(Edge.make_bspline(
                [(7.5, -6), (7.5, -8.629618531), (14, -10.119735698)],
                knots=[0, 0, 0, 0.610725176, 0.610725176, 0.610725176], degree=2, weights=[1, 0.821122737, 0.86073517]))
            Line((14, -10.119735698), (14, -5.9999999))
            Line((14, -5.9999999), (7.5, -6))
        make_face()
    extrude(amount=FILLET7_2_DEPTH, mode=Mode.SUBTRACT)

    # Fillet8
    fillet8_edges = [part.edges().sort_by_distance(p)[0] for p in [
        (-39.75, 18.5, 12.75),
        (-39.75, 3.5, 12.75),
        (39.75, 18.5, 12.75),
        (39.75, 3.5, 12.75),
    ]]
    fillet(fillet8_edges, radius=FILLET8_R - 0.0001)  # a hair under: the kernel refuses the full size

    # Sketch9 → Cut-Extrude2 (cut, through all)
    with BuildSketch(Plane.XY.offset(3)):
        with Locations((-18.25, 46)):
            Circle(SKETCH9_R)
        with Locations(Location((18.25, 46, 0), (0, 0, 180))):
            Circle(SKETCH9_R)
    extrude(amount=-CUT_EXTRUDE2_DEPTH, mode=Mode.SUBTRACT)

    # Sketch10 → Cut-Extrude3 (cut)
    with BuildSketch(Plane(origin=(0, 0, 0), x_dir=(-1, 0, 0), z_dir=(0, 0, -1))):
        with Locations((-18.25, 46)):
            Circle(SKETCH10_R)
        with Locations((18.25, 46)):
            Circle(SKETCH10_R)
    extrude(amount=-CUT_EXTRUDE3_DEPTH, mode=Mode.SUBTRACT)


solid = part.part
